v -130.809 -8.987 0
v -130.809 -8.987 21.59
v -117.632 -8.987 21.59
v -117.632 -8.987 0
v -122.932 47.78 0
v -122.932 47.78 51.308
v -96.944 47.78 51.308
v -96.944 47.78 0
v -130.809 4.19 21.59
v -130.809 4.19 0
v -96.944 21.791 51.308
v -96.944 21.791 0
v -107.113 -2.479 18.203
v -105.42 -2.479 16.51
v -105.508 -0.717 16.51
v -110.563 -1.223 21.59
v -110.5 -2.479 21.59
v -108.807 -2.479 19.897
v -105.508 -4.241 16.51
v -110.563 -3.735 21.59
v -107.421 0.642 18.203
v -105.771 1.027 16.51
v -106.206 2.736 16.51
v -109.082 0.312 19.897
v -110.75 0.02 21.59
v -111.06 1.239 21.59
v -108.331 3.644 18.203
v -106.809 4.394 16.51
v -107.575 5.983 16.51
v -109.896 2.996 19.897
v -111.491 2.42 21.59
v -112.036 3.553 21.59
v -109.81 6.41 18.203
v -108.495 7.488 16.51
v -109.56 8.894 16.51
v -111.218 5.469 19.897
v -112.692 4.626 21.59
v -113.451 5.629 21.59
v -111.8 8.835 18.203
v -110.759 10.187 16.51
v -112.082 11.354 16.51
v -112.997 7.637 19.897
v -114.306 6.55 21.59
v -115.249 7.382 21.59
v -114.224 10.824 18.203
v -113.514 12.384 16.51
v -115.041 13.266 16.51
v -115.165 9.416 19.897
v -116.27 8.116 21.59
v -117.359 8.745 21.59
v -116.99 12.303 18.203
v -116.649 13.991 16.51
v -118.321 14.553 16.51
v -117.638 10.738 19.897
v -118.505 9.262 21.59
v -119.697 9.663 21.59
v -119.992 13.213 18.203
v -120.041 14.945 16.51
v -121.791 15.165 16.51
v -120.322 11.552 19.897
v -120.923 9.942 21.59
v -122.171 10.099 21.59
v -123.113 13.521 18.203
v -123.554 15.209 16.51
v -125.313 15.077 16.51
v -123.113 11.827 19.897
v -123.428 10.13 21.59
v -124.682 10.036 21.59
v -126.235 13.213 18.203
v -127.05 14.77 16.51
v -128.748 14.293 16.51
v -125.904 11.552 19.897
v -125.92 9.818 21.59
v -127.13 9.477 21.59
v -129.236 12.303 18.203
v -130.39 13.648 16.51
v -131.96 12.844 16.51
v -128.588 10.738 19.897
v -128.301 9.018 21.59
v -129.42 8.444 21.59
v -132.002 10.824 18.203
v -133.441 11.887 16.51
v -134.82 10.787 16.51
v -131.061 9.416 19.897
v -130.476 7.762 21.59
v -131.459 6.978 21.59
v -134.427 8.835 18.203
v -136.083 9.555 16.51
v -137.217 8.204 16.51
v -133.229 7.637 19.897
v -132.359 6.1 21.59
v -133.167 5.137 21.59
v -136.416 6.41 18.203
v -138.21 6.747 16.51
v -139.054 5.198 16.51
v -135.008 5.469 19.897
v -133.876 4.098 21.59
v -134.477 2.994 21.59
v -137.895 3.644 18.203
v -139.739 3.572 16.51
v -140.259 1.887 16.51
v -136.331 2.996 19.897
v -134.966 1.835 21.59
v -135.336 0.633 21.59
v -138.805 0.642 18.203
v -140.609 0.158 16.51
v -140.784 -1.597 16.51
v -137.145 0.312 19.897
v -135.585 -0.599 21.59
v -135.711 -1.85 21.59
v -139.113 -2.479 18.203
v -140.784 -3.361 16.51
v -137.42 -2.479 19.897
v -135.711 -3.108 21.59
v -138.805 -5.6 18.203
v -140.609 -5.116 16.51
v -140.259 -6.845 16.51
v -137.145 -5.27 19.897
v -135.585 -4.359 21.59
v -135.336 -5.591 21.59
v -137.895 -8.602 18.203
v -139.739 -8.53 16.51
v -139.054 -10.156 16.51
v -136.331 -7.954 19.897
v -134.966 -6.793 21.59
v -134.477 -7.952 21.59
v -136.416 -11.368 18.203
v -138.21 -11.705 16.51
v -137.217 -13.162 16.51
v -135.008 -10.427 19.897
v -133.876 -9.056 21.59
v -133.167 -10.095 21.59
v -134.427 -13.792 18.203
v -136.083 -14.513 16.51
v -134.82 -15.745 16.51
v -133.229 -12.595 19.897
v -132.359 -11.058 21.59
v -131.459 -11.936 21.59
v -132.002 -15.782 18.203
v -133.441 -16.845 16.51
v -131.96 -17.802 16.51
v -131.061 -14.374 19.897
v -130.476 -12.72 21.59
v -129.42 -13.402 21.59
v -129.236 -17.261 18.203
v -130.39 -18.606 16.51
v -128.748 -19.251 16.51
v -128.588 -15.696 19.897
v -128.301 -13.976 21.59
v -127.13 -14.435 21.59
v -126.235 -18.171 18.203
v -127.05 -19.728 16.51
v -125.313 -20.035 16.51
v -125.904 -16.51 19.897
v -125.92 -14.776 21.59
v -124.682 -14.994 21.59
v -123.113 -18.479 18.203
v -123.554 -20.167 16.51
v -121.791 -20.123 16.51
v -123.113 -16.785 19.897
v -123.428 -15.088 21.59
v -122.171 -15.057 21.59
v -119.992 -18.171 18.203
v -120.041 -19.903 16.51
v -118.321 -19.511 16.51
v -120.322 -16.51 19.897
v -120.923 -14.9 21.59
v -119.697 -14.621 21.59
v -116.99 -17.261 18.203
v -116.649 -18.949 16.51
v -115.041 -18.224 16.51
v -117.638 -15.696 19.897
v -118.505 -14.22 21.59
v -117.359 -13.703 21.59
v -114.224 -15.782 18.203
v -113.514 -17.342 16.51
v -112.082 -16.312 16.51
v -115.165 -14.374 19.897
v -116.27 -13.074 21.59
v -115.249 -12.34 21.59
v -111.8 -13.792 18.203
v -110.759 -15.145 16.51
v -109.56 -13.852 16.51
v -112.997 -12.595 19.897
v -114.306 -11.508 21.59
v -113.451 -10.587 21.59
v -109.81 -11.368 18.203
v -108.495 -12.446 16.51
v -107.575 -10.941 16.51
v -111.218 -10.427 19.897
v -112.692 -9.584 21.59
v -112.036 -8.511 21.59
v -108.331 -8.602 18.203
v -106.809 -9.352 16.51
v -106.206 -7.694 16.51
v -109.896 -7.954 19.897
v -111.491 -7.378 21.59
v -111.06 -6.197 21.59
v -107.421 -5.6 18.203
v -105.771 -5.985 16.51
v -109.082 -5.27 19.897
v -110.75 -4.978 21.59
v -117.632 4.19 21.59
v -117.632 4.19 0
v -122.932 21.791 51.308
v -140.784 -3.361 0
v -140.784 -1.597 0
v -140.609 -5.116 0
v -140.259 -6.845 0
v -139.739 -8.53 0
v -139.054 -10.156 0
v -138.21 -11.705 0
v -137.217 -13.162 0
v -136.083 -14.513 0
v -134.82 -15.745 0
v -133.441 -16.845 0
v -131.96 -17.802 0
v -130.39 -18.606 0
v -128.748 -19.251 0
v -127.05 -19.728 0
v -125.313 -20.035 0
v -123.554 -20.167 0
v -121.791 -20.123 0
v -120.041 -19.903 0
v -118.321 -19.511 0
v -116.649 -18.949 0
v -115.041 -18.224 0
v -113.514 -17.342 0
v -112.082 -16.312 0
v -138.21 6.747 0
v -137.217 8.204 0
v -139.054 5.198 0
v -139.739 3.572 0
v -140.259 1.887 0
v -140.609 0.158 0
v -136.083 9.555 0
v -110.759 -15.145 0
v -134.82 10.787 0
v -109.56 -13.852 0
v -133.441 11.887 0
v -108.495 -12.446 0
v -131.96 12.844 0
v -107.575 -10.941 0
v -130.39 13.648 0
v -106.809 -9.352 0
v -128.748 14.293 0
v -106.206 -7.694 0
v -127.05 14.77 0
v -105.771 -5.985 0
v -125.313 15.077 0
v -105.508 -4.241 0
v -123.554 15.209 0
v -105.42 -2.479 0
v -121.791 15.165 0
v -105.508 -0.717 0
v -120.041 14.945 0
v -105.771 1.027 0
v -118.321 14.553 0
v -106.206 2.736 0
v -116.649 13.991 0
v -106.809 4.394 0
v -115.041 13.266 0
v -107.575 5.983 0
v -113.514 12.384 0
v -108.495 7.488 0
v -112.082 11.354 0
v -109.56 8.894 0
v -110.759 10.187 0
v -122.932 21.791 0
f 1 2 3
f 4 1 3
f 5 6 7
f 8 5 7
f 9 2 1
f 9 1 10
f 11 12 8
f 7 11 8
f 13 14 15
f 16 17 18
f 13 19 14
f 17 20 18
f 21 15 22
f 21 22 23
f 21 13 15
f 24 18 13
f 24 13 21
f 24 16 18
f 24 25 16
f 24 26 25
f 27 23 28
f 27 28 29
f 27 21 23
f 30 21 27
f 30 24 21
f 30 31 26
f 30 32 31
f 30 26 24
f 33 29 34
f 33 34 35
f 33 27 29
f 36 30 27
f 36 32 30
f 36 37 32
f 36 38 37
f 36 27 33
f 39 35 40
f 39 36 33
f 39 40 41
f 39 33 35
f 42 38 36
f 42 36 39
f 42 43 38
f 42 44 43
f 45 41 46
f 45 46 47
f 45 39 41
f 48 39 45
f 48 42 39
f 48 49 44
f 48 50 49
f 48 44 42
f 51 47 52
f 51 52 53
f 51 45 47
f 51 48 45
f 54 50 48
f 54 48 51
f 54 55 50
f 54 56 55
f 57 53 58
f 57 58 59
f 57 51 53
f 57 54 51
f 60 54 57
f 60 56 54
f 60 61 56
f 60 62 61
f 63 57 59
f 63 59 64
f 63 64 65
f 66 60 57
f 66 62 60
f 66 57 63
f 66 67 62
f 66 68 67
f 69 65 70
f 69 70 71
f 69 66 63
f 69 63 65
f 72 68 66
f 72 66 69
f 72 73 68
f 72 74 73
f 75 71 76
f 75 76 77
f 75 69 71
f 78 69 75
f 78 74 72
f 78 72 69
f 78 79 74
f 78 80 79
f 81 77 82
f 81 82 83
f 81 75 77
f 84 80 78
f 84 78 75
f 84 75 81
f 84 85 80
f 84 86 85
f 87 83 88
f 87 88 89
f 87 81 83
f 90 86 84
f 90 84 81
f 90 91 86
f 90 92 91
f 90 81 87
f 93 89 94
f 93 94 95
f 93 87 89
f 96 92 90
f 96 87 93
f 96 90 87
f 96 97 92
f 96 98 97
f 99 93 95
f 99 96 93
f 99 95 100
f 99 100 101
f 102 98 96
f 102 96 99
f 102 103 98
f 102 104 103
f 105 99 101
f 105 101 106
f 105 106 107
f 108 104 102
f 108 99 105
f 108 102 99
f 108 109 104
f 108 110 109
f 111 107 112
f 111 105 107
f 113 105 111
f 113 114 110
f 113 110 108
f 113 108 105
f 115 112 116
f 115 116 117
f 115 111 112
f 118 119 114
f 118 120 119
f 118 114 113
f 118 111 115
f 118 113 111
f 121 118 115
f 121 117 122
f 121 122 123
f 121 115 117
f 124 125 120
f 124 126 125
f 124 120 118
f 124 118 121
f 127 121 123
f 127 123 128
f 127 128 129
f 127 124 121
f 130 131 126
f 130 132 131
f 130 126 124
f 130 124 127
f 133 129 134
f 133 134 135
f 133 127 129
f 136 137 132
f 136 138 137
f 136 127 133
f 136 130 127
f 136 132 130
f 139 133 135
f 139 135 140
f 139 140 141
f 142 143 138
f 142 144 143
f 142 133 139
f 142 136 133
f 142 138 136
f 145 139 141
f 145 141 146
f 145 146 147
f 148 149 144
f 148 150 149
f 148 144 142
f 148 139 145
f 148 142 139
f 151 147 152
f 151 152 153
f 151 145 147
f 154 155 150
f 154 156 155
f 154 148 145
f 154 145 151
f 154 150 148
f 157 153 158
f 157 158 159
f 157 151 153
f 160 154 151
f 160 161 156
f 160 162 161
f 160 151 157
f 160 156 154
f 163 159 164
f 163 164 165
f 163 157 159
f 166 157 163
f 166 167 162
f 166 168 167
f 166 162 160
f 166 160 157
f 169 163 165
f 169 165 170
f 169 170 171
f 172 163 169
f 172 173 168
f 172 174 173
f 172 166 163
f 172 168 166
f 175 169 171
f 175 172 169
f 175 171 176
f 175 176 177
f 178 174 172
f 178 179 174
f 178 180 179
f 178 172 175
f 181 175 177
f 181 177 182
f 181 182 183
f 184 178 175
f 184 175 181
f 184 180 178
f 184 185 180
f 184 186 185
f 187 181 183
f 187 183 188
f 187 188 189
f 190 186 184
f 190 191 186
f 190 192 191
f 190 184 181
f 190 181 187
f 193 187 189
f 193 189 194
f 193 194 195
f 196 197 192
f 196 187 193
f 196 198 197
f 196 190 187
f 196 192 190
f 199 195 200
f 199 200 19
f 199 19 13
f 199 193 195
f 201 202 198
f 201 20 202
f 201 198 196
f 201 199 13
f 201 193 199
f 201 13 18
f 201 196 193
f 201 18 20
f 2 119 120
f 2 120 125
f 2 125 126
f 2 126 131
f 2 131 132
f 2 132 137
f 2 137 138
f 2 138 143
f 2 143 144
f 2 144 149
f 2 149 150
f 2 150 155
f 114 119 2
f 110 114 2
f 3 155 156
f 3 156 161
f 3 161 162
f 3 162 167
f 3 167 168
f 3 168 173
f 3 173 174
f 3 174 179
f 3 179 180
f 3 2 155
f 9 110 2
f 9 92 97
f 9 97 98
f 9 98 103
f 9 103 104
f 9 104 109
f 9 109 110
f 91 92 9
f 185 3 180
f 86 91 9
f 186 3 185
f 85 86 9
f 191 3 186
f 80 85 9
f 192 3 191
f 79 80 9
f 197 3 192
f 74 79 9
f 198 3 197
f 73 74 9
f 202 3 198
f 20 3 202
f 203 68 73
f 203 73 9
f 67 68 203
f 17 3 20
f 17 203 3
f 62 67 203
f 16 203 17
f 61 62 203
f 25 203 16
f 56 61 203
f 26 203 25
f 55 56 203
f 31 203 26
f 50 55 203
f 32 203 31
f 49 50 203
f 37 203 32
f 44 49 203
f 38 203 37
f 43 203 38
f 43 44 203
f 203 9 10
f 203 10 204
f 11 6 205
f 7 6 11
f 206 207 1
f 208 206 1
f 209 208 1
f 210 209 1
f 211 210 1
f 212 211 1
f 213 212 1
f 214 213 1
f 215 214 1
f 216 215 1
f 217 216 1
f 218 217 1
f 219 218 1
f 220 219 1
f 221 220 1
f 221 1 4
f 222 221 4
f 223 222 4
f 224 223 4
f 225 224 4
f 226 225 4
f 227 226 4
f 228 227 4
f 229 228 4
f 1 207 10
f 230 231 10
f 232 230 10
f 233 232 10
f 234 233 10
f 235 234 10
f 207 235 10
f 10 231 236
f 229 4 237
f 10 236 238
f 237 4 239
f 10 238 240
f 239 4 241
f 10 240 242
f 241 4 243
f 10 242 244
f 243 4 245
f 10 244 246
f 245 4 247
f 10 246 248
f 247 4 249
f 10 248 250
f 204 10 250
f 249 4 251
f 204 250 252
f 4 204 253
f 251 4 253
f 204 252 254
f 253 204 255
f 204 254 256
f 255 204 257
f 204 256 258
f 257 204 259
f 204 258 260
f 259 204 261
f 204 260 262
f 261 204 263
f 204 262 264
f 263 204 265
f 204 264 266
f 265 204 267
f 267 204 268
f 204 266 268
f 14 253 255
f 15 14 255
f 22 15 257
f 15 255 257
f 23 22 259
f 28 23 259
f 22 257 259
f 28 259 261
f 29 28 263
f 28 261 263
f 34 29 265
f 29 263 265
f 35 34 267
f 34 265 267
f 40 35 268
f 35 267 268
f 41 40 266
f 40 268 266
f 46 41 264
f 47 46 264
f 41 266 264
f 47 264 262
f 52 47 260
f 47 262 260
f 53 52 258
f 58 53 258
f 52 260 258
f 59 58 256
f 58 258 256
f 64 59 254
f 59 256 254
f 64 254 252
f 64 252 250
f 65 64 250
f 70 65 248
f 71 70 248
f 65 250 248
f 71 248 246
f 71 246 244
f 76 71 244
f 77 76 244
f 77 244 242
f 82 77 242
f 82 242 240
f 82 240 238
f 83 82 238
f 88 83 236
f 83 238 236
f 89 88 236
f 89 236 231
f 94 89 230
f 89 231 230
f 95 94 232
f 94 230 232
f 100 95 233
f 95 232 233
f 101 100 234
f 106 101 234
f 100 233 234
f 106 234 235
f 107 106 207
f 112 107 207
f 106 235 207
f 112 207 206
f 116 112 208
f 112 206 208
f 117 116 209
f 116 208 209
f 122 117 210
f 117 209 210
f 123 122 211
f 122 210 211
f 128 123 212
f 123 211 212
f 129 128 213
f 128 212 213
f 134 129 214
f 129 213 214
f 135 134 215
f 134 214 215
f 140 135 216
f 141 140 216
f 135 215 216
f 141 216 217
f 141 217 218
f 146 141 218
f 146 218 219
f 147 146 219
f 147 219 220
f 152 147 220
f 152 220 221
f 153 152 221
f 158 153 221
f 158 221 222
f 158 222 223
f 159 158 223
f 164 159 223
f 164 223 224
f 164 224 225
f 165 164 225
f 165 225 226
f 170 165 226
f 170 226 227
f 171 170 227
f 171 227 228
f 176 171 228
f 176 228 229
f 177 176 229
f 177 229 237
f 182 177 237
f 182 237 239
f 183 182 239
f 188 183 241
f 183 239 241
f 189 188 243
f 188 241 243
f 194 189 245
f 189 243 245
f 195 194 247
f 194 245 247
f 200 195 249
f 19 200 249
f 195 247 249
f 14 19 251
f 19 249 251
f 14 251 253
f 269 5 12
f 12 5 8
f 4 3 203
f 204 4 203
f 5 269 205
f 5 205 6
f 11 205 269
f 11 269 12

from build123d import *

# Parameters (mm, degrees)
F0_W     = 25.9884092957
F0_H     = 25.9884092957
F1_DEPTH = 51.308
F2_R     = 17.6930422515
F3_DEPTH = 21.59
F4_W     = 13.1772533059
F4_H     = 13.1772533059
F5_DEPTH = 25.4
F6_DEPTH = 65.278
F7_SIZE  = 5.08


with BuildPart() as f1:
    # F0 (on Top) → F1 (new body)
    with BuildSketch(Plane.XY):
        with Locations((-109.9380506203, 34.7855379805)):
            Rectangle(F0_W, F0_H)
    extrude(amount=F1_DEPTH)



with BuildPart() as f3:
    # F2 (on Top) → F3 (new body)
    with BuildSketch(Plane.XY):
        with Locations((-123.1131777167, -2.4789941963)):
            Circle(F2_R)
    extrude(amount=F3_DEPTH)

    # F4 (on face) → F5 (cut)
    with BuildSketch(Plane.XY.offset(21.59)):
        with Locations((-124.220173806, -2.3982524872)):
            Rectangle(F4_W, F4_H)
    extrude(amount=-F5_DEPTH, mode=Mode.SUBTRACT)


with BuildPart() as f1_1:
    add(f1.part)
    # F6 (cut): a face of the model
    f6_faces = [f3.part.faces().sort_by_distance(p)[0] for p in [
        (-140.305785162, -2.4789941963, 21.59),
    ]]
    extrude(f6_faces, amount=F6_DEPTH, mode=Mode.SUBTRACT)


with BuildPart() as f3_1:
    add(f3.part)

    # F7
    f7_edges = [f3_1.edges().sort_by_distance(p)[0] for p in [
        (-140.80622, -2.478994, 21.59),
    ]]
    chamfer(f7_edges, length=F7_SIZE)


solid = Compound([f1_1.part, f3_1.part])
